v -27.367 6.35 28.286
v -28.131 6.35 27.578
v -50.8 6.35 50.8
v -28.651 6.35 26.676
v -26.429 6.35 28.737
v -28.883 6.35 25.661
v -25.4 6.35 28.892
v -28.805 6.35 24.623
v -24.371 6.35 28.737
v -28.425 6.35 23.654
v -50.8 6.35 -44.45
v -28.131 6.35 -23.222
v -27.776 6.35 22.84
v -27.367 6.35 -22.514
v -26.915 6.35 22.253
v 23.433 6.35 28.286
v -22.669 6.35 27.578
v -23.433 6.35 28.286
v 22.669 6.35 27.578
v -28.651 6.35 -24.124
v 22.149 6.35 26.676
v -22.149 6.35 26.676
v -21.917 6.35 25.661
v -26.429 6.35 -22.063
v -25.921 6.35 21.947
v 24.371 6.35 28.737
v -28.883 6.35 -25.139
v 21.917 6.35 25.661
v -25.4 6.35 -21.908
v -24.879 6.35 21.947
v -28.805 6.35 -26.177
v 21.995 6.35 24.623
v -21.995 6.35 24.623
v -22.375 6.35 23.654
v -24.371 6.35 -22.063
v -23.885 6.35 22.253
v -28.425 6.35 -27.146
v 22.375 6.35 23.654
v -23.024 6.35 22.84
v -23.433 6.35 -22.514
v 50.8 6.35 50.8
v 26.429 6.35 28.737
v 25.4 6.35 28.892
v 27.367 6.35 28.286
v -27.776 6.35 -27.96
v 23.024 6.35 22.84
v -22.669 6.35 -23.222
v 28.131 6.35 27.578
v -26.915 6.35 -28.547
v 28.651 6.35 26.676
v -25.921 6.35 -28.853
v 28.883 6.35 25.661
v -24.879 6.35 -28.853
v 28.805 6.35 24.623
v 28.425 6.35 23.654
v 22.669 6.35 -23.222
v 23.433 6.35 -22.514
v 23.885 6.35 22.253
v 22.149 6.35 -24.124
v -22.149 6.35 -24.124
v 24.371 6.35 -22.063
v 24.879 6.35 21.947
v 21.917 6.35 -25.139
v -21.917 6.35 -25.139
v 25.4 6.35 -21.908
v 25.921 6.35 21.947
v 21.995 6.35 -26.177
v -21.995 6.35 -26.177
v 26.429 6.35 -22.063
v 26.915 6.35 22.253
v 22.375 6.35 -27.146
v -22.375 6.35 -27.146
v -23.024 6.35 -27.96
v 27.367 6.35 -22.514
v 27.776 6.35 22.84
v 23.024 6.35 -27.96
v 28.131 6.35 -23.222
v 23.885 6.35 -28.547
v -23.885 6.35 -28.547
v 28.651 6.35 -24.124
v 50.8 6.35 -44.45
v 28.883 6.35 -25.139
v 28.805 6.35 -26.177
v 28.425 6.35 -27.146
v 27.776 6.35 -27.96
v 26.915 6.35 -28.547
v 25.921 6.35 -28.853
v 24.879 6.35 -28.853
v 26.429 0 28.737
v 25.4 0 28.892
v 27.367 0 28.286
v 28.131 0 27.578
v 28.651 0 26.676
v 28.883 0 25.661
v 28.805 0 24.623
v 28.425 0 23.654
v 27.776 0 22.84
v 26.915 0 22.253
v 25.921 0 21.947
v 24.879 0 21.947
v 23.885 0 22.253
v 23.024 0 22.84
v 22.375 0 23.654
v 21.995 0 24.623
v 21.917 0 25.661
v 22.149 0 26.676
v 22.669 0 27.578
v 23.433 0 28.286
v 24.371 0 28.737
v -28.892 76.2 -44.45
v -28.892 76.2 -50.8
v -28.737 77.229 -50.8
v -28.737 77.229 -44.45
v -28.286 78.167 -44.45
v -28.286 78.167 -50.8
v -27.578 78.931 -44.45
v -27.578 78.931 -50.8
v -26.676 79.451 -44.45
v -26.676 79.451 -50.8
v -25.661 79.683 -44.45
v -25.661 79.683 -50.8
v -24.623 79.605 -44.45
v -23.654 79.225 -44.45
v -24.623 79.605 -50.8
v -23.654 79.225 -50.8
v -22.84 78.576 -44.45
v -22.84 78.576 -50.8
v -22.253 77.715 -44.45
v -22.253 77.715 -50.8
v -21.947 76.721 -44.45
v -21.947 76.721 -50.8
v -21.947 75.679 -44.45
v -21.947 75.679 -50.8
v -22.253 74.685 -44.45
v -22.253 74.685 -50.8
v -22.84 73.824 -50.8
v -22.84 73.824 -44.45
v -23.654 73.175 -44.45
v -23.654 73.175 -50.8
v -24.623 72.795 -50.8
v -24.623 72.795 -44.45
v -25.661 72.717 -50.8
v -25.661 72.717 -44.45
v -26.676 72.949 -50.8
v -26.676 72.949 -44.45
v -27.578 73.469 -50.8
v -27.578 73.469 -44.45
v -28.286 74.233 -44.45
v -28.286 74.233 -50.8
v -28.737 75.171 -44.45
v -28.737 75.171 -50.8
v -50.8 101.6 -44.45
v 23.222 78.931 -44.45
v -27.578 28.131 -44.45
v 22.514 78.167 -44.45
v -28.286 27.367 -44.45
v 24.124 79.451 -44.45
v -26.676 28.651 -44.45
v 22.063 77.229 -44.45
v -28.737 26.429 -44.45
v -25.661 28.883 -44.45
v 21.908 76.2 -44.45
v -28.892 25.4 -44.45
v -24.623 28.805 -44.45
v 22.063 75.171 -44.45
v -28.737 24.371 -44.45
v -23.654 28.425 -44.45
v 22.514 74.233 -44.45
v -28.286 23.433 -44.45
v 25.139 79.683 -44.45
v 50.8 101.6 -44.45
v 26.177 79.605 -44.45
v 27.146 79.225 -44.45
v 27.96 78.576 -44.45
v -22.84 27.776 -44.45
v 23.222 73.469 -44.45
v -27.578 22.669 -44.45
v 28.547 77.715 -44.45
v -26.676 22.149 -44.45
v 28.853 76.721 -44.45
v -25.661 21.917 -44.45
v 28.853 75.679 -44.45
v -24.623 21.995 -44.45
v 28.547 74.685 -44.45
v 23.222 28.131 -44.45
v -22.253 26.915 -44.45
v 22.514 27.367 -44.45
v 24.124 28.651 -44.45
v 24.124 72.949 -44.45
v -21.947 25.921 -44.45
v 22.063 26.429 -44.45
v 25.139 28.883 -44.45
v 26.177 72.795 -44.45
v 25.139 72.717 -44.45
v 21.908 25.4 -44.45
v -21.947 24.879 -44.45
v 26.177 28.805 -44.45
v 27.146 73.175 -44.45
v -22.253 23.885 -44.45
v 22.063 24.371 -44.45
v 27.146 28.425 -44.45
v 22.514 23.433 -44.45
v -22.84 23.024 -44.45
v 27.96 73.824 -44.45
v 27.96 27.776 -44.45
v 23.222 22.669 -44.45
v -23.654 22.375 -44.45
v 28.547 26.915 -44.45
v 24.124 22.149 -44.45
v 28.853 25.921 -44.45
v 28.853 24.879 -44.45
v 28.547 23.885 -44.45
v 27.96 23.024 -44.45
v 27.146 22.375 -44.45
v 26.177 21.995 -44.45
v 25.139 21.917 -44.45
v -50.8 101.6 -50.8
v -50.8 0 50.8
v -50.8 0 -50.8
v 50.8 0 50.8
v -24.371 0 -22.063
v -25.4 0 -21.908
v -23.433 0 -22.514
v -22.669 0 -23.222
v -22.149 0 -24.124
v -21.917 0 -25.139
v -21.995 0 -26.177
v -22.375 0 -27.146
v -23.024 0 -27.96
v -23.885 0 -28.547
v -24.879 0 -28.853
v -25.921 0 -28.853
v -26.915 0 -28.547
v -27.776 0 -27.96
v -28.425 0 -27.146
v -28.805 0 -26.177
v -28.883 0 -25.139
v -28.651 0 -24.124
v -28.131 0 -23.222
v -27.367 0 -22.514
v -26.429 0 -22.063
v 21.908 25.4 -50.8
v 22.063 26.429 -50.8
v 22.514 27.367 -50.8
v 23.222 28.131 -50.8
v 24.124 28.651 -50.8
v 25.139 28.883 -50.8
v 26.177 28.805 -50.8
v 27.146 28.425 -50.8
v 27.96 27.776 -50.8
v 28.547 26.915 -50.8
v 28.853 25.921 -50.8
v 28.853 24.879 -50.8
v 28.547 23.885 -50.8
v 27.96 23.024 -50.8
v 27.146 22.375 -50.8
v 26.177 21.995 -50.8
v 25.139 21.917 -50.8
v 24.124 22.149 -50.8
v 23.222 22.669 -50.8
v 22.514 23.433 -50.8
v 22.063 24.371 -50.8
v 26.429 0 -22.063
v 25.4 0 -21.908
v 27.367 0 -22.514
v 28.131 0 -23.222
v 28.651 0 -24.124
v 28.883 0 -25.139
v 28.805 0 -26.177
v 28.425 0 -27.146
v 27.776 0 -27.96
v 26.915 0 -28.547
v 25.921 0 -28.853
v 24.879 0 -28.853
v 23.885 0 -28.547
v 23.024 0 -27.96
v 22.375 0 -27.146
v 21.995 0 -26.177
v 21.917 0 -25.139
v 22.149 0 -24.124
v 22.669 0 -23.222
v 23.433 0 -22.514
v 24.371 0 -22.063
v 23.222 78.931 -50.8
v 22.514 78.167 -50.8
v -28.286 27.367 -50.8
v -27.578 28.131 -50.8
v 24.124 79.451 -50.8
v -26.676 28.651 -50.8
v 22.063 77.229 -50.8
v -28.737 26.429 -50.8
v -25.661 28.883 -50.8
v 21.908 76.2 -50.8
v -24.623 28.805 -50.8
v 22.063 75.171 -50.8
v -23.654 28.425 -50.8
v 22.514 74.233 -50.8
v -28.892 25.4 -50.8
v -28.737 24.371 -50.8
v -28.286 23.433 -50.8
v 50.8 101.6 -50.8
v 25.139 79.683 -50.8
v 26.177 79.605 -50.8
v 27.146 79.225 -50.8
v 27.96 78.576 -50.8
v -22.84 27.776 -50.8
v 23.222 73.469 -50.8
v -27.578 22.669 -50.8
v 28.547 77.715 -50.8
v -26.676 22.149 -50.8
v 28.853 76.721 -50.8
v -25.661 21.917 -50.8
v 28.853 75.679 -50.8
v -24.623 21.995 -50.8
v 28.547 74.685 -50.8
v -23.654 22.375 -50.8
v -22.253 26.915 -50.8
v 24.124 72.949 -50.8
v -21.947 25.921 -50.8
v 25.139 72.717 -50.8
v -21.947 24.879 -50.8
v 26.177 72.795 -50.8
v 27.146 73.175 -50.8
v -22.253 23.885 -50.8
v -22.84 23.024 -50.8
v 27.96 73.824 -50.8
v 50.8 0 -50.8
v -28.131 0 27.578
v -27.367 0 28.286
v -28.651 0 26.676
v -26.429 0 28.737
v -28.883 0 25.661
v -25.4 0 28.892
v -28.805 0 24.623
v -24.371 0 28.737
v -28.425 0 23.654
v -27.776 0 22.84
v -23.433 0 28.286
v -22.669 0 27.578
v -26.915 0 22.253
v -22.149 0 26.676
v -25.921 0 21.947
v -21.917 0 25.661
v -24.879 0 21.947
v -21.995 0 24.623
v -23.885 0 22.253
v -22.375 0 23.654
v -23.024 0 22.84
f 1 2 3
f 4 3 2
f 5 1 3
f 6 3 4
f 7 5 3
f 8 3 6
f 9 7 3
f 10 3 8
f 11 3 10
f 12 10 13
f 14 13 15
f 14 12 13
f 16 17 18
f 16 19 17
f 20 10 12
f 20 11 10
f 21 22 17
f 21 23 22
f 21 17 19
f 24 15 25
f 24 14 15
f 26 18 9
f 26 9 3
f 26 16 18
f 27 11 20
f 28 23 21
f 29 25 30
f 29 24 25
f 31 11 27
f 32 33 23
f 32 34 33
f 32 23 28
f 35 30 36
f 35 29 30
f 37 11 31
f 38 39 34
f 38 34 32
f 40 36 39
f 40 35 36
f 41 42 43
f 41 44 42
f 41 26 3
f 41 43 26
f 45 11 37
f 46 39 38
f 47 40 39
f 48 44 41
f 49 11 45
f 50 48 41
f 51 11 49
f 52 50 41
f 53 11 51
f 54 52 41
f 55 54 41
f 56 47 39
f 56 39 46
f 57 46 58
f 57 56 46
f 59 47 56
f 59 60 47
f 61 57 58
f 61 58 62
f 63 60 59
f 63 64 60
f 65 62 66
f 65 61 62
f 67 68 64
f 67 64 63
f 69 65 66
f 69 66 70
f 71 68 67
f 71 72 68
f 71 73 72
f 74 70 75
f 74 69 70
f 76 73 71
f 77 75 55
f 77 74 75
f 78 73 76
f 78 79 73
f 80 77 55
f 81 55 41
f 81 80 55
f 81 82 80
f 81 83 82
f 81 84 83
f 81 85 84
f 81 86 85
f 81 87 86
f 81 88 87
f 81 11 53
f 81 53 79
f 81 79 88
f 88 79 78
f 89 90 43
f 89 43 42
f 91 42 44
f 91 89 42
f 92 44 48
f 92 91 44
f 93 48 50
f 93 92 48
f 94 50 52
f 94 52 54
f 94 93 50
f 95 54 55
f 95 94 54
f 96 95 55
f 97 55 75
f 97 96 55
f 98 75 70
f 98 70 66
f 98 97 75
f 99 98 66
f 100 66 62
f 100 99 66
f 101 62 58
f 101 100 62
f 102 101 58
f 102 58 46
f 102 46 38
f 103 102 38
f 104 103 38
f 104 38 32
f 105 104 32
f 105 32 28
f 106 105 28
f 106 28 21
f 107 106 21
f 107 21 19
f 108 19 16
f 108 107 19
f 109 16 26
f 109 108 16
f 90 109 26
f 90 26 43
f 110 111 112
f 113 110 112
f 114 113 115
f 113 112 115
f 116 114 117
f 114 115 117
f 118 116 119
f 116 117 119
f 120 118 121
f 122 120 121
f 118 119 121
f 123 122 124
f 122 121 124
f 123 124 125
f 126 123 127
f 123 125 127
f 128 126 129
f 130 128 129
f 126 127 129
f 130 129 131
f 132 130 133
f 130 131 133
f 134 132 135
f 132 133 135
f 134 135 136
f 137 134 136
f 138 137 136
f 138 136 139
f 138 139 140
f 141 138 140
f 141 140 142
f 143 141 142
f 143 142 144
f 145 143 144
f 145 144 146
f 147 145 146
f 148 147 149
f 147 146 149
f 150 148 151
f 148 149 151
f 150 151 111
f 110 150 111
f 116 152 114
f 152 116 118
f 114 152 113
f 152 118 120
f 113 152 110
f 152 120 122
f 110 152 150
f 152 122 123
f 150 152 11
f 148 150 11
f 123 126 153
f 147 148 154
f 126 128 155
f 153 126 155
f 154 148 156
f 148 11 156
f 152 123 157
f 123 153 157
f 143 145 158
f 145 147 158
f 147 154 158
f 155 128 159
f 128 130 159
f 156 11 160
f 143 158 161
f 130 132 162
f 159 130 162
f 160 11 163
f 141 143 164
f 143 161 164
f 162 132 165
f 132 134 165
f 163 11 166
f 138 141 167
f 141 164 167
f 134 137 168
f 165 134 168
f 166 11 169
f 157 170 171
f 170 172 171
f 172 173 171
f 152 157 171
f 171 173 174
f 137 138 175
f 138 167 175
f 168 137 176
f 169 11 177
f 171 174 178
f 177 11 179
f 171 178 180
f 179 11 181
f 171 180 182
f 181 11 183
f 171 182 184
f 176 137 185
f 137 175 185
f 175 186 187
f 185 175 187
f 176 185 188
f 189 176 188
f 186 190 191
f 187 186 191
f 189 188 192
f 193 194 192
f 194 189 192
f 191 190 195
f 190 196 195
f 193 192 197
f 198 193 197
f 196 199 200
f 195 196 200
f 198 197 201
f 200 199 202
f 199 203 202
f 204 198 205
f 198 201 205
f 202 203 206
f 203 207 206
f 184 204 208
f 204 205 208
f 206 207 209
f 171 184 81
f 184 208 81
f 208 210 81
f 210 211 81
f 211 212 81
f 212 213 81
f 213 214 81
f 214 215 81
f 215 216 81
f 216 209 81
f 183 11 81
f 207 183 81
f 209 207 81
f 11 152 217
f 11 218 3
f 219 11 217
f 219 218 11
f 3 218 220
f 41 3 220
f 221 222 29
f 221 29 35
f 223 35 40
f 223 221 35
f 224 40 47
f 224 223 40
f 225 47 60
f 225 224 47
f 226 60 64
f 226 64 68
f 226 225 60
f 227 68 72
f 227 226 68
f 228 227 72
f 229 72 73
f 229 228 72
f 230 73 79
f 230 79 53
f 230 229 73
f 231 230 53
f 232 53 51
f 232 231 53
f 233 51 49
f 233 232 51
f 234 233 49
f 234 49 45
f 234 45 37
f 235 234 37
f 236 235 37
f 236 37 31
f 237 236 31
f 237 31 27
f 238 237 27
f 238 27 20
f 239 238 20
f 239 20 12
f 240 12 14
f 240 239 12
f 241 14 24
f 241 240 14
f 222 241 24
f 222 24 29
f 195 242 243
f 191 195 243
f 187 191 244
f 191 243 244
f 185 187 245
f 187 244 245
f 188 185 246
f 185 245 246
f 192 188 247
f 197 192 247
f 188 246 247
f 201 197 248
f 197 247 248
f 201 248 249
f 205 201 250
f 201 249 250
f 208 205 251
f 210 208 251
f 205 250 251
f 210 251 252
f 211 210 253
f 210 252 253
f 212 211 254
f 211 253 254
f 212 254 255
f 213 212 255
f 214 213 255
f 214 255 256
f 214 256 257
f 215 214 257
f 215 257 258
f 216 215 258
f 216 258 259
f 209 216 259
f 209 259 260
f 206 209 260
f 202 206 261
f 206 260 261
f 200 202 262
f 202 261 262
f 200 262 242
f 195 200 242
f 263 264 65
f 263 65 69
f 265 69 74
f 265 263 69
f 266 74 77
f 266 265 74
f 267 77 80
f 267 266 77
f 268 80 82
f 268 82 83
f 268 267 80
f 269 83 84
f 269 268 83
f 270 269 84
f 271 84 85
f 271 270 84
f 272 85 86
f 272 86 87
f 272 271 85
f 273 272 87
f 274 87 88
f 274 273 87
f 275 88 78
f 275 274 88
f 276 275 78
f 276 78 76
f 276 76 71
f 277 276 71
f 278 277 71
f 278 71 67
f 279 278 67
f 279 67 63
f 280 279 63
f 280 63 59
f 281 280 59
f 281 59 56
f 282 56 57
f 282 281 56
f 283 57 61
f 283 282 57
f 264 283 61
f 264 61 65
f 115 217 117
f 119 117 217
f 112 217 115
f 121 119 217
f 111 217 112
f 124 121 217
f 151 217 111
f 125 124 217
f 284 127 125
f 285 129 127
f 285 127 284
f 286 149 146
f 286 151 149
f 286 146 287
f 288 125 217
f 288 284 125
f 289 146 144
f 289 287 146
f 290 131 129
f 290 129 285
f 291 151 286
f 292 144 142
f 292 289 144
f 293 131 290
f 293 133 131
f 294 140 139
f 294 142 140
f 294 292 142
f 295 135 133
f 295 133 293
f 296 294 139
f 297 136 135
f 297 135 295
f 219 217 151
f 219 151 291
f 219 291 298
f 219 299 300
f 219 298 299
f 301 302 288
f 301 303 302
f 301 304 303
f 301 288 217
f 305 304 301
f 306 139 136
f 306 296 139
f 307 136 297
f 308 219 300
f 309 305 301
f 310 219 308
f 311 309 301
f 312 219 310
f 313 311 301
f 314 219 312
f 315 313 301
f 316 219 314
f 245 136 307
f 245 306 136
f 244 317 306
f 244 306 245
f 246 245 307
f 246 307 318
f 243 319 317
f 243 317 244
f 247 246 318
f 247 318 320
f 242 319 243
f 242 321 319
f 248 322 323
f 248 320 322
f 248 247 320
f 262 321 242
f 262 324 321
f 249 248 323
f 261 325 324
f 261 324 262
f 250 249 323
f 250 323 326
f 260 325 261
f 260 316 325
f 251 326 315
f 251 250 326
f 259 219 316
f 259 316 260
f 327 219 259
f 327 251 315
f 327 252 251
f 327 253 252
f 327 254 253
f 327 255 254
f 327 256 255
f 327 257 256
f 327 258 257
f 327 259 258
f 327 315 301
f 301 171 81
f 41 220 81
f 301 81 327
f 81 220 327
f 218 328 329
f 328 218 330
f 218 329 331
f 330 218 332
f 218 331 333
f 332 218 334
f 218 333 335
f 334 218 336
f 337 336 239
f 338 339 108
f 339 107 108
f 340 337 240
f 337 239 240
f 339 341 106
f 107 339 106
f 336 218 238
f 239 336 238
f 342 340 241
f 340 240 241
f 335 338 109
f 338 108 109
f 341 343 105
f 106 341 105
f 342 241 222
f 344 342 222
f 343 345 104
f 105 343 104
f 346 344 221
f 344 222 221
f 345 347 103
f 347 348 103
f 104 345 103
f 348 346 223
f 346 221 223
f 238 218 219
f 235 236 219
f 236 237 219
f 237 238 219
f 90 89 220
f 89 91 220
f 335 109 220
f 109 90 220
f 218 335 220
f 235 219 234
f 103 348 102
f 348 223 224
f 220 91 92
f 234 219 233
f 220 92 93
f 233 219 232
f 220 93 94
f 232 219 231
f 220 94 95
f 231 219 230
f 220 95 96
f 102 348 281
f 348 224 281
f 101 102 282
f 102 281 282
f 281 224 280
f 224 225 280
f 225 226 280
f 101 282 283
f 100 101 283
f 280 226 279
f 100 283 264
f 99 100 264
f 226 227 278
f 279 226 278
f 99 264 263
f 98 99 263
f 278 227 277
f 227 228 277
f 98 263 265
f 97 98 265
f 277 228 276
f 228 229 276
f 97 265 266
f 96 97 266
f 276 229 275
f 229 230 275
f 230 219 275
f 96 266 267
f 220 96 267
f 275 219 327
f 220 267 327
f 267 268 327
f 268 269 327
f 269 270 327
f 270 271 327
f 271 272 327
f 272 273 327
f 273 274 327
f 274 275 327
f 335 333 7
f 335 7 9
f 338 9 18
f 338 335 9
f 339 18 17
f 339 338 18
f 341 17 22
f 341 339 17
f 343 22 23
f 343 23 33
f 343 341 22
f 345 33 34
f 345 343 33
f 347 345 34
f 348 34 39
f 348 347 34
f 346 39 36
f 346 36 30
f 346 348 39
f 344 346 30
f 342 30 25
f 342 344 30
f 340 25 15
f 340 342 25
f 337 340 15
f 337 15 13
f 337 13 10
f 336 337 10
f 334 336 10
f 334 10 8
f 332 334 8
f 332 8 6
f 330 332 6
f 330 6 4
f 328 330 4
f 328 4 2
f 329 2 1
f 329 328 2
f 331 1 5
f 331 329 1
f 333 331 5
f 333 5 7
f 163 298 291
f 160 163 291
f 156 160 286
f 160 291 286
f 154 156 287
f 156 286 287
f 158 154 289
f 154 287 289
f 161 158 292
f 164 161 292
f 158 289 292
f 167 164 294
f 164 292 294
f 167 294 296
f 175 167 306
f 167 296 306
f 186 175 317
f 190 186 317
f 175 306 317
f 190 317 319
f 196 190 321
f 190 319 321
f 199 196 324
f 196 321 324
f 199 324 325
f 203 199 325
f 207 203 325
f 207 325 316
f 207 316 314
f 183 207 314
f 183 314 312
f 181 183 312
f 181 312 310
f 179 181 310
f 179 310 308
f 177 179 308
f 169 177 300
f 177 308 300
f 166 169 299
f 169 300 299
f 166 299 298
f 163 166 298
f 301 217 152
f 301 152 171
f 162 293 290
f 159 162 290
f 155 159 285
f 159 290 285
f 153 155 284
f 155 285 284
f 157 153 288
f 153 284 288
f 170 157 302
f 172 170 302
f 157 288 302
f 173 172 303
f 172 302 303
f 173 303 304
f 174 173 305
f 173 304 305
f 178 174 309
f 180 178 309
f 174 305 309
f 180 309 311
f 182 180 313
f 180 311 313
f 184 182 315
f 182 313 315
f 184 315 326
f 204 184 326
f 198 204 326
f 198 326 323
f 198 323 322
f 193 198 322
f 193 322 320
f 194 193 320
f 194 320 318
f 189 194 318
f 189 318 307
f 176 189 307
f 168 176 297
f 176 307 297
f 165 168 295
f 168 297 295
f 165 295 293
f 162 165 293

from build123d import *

# Parameters (mm, degrees)
SKETCH1_W           = 101.6
SKETCH1_H           = 101.6
SKETCH1_R           = 3.4925
BOSS_EXTRUDE1_DEPTH = 6.35
SKETCH2_W           = 101.6
SKETCH2_H           = 6.35
BOSS_EXTRUDE2_DEPTH = 95.25
SKETCH3_R           = 3.4925
CUT_EXTRUDE1_DEPTH  = 6.35


with BuildPart() as part:
    # Sketch1 → Boss-Extrude1 (new body)
    with BuildSketch(Plane(origin=(0, 0, 0), x_dir=(1, 0, 0), z_dir=(0, 1, 0))):
        Rectangle(SKETCH1_W, SKETCH1_H)
        with Locations(Location((-25.4, 25.4, 0), (0, 0, 270))):
            Circle(SKETCH1_R, mode=Mode.SUBTRACT)
        with Locations(Location((25.4, 25.4, 0), (0, 0, 270))):
            Circle(SKETCH1_R, mode=Mode.SUBTRACT)
        with Locations(Location((25.4, -25.4, 0), (0, 0, 270))):
            Circle(SKETCH1_R, mode=Mode.SUBTRACT)
        with Locations(Location((-25.4, -25.4, 0), (0, 0, 270))):
            Circle(SKETCH1_R, mode=Mode.SUBTRACT)
    extrude(amount=BOSS_EXTRUDE1_DEPTH)

    # Sketch2 → Boss-Extrude2 (add)
    with BuildSketch(Plane(origin=(0, 6.35, 0), x_dir=(1, 0, 0), z_dir=(0, 1, 0))):
        with Locations((0, 47.625)):
            Rectangle(SKETCH2_W, SKETCH2_H)
    extrude(amount=BOSS_EXTRUDE2_DEPTH)

    # Sketch3 → Cut-Extrude1 (cut)
    with BuildSketch(Plane(origin=(0, 0, -50.8), x_dir=(-1, 0, 0), z_dir=(0, 0, -1))):
        with Locations((-25.4, 76.2)):
            Circle(SKETCH3_R)
        with Locations((25.4, 76.2)):
            Circle(SKETCH3_R)
        with Locations((25.4, 25.4)):
            Circle(SKETCH3_R)
        with Locations((-25.4, 25.4)):
            Circle(SKETCH3_R)
    extrude(amount=-CUT_EXTRUDE1_DEPTH, mode=Mode.SUBTRACT)


solid = part.part
